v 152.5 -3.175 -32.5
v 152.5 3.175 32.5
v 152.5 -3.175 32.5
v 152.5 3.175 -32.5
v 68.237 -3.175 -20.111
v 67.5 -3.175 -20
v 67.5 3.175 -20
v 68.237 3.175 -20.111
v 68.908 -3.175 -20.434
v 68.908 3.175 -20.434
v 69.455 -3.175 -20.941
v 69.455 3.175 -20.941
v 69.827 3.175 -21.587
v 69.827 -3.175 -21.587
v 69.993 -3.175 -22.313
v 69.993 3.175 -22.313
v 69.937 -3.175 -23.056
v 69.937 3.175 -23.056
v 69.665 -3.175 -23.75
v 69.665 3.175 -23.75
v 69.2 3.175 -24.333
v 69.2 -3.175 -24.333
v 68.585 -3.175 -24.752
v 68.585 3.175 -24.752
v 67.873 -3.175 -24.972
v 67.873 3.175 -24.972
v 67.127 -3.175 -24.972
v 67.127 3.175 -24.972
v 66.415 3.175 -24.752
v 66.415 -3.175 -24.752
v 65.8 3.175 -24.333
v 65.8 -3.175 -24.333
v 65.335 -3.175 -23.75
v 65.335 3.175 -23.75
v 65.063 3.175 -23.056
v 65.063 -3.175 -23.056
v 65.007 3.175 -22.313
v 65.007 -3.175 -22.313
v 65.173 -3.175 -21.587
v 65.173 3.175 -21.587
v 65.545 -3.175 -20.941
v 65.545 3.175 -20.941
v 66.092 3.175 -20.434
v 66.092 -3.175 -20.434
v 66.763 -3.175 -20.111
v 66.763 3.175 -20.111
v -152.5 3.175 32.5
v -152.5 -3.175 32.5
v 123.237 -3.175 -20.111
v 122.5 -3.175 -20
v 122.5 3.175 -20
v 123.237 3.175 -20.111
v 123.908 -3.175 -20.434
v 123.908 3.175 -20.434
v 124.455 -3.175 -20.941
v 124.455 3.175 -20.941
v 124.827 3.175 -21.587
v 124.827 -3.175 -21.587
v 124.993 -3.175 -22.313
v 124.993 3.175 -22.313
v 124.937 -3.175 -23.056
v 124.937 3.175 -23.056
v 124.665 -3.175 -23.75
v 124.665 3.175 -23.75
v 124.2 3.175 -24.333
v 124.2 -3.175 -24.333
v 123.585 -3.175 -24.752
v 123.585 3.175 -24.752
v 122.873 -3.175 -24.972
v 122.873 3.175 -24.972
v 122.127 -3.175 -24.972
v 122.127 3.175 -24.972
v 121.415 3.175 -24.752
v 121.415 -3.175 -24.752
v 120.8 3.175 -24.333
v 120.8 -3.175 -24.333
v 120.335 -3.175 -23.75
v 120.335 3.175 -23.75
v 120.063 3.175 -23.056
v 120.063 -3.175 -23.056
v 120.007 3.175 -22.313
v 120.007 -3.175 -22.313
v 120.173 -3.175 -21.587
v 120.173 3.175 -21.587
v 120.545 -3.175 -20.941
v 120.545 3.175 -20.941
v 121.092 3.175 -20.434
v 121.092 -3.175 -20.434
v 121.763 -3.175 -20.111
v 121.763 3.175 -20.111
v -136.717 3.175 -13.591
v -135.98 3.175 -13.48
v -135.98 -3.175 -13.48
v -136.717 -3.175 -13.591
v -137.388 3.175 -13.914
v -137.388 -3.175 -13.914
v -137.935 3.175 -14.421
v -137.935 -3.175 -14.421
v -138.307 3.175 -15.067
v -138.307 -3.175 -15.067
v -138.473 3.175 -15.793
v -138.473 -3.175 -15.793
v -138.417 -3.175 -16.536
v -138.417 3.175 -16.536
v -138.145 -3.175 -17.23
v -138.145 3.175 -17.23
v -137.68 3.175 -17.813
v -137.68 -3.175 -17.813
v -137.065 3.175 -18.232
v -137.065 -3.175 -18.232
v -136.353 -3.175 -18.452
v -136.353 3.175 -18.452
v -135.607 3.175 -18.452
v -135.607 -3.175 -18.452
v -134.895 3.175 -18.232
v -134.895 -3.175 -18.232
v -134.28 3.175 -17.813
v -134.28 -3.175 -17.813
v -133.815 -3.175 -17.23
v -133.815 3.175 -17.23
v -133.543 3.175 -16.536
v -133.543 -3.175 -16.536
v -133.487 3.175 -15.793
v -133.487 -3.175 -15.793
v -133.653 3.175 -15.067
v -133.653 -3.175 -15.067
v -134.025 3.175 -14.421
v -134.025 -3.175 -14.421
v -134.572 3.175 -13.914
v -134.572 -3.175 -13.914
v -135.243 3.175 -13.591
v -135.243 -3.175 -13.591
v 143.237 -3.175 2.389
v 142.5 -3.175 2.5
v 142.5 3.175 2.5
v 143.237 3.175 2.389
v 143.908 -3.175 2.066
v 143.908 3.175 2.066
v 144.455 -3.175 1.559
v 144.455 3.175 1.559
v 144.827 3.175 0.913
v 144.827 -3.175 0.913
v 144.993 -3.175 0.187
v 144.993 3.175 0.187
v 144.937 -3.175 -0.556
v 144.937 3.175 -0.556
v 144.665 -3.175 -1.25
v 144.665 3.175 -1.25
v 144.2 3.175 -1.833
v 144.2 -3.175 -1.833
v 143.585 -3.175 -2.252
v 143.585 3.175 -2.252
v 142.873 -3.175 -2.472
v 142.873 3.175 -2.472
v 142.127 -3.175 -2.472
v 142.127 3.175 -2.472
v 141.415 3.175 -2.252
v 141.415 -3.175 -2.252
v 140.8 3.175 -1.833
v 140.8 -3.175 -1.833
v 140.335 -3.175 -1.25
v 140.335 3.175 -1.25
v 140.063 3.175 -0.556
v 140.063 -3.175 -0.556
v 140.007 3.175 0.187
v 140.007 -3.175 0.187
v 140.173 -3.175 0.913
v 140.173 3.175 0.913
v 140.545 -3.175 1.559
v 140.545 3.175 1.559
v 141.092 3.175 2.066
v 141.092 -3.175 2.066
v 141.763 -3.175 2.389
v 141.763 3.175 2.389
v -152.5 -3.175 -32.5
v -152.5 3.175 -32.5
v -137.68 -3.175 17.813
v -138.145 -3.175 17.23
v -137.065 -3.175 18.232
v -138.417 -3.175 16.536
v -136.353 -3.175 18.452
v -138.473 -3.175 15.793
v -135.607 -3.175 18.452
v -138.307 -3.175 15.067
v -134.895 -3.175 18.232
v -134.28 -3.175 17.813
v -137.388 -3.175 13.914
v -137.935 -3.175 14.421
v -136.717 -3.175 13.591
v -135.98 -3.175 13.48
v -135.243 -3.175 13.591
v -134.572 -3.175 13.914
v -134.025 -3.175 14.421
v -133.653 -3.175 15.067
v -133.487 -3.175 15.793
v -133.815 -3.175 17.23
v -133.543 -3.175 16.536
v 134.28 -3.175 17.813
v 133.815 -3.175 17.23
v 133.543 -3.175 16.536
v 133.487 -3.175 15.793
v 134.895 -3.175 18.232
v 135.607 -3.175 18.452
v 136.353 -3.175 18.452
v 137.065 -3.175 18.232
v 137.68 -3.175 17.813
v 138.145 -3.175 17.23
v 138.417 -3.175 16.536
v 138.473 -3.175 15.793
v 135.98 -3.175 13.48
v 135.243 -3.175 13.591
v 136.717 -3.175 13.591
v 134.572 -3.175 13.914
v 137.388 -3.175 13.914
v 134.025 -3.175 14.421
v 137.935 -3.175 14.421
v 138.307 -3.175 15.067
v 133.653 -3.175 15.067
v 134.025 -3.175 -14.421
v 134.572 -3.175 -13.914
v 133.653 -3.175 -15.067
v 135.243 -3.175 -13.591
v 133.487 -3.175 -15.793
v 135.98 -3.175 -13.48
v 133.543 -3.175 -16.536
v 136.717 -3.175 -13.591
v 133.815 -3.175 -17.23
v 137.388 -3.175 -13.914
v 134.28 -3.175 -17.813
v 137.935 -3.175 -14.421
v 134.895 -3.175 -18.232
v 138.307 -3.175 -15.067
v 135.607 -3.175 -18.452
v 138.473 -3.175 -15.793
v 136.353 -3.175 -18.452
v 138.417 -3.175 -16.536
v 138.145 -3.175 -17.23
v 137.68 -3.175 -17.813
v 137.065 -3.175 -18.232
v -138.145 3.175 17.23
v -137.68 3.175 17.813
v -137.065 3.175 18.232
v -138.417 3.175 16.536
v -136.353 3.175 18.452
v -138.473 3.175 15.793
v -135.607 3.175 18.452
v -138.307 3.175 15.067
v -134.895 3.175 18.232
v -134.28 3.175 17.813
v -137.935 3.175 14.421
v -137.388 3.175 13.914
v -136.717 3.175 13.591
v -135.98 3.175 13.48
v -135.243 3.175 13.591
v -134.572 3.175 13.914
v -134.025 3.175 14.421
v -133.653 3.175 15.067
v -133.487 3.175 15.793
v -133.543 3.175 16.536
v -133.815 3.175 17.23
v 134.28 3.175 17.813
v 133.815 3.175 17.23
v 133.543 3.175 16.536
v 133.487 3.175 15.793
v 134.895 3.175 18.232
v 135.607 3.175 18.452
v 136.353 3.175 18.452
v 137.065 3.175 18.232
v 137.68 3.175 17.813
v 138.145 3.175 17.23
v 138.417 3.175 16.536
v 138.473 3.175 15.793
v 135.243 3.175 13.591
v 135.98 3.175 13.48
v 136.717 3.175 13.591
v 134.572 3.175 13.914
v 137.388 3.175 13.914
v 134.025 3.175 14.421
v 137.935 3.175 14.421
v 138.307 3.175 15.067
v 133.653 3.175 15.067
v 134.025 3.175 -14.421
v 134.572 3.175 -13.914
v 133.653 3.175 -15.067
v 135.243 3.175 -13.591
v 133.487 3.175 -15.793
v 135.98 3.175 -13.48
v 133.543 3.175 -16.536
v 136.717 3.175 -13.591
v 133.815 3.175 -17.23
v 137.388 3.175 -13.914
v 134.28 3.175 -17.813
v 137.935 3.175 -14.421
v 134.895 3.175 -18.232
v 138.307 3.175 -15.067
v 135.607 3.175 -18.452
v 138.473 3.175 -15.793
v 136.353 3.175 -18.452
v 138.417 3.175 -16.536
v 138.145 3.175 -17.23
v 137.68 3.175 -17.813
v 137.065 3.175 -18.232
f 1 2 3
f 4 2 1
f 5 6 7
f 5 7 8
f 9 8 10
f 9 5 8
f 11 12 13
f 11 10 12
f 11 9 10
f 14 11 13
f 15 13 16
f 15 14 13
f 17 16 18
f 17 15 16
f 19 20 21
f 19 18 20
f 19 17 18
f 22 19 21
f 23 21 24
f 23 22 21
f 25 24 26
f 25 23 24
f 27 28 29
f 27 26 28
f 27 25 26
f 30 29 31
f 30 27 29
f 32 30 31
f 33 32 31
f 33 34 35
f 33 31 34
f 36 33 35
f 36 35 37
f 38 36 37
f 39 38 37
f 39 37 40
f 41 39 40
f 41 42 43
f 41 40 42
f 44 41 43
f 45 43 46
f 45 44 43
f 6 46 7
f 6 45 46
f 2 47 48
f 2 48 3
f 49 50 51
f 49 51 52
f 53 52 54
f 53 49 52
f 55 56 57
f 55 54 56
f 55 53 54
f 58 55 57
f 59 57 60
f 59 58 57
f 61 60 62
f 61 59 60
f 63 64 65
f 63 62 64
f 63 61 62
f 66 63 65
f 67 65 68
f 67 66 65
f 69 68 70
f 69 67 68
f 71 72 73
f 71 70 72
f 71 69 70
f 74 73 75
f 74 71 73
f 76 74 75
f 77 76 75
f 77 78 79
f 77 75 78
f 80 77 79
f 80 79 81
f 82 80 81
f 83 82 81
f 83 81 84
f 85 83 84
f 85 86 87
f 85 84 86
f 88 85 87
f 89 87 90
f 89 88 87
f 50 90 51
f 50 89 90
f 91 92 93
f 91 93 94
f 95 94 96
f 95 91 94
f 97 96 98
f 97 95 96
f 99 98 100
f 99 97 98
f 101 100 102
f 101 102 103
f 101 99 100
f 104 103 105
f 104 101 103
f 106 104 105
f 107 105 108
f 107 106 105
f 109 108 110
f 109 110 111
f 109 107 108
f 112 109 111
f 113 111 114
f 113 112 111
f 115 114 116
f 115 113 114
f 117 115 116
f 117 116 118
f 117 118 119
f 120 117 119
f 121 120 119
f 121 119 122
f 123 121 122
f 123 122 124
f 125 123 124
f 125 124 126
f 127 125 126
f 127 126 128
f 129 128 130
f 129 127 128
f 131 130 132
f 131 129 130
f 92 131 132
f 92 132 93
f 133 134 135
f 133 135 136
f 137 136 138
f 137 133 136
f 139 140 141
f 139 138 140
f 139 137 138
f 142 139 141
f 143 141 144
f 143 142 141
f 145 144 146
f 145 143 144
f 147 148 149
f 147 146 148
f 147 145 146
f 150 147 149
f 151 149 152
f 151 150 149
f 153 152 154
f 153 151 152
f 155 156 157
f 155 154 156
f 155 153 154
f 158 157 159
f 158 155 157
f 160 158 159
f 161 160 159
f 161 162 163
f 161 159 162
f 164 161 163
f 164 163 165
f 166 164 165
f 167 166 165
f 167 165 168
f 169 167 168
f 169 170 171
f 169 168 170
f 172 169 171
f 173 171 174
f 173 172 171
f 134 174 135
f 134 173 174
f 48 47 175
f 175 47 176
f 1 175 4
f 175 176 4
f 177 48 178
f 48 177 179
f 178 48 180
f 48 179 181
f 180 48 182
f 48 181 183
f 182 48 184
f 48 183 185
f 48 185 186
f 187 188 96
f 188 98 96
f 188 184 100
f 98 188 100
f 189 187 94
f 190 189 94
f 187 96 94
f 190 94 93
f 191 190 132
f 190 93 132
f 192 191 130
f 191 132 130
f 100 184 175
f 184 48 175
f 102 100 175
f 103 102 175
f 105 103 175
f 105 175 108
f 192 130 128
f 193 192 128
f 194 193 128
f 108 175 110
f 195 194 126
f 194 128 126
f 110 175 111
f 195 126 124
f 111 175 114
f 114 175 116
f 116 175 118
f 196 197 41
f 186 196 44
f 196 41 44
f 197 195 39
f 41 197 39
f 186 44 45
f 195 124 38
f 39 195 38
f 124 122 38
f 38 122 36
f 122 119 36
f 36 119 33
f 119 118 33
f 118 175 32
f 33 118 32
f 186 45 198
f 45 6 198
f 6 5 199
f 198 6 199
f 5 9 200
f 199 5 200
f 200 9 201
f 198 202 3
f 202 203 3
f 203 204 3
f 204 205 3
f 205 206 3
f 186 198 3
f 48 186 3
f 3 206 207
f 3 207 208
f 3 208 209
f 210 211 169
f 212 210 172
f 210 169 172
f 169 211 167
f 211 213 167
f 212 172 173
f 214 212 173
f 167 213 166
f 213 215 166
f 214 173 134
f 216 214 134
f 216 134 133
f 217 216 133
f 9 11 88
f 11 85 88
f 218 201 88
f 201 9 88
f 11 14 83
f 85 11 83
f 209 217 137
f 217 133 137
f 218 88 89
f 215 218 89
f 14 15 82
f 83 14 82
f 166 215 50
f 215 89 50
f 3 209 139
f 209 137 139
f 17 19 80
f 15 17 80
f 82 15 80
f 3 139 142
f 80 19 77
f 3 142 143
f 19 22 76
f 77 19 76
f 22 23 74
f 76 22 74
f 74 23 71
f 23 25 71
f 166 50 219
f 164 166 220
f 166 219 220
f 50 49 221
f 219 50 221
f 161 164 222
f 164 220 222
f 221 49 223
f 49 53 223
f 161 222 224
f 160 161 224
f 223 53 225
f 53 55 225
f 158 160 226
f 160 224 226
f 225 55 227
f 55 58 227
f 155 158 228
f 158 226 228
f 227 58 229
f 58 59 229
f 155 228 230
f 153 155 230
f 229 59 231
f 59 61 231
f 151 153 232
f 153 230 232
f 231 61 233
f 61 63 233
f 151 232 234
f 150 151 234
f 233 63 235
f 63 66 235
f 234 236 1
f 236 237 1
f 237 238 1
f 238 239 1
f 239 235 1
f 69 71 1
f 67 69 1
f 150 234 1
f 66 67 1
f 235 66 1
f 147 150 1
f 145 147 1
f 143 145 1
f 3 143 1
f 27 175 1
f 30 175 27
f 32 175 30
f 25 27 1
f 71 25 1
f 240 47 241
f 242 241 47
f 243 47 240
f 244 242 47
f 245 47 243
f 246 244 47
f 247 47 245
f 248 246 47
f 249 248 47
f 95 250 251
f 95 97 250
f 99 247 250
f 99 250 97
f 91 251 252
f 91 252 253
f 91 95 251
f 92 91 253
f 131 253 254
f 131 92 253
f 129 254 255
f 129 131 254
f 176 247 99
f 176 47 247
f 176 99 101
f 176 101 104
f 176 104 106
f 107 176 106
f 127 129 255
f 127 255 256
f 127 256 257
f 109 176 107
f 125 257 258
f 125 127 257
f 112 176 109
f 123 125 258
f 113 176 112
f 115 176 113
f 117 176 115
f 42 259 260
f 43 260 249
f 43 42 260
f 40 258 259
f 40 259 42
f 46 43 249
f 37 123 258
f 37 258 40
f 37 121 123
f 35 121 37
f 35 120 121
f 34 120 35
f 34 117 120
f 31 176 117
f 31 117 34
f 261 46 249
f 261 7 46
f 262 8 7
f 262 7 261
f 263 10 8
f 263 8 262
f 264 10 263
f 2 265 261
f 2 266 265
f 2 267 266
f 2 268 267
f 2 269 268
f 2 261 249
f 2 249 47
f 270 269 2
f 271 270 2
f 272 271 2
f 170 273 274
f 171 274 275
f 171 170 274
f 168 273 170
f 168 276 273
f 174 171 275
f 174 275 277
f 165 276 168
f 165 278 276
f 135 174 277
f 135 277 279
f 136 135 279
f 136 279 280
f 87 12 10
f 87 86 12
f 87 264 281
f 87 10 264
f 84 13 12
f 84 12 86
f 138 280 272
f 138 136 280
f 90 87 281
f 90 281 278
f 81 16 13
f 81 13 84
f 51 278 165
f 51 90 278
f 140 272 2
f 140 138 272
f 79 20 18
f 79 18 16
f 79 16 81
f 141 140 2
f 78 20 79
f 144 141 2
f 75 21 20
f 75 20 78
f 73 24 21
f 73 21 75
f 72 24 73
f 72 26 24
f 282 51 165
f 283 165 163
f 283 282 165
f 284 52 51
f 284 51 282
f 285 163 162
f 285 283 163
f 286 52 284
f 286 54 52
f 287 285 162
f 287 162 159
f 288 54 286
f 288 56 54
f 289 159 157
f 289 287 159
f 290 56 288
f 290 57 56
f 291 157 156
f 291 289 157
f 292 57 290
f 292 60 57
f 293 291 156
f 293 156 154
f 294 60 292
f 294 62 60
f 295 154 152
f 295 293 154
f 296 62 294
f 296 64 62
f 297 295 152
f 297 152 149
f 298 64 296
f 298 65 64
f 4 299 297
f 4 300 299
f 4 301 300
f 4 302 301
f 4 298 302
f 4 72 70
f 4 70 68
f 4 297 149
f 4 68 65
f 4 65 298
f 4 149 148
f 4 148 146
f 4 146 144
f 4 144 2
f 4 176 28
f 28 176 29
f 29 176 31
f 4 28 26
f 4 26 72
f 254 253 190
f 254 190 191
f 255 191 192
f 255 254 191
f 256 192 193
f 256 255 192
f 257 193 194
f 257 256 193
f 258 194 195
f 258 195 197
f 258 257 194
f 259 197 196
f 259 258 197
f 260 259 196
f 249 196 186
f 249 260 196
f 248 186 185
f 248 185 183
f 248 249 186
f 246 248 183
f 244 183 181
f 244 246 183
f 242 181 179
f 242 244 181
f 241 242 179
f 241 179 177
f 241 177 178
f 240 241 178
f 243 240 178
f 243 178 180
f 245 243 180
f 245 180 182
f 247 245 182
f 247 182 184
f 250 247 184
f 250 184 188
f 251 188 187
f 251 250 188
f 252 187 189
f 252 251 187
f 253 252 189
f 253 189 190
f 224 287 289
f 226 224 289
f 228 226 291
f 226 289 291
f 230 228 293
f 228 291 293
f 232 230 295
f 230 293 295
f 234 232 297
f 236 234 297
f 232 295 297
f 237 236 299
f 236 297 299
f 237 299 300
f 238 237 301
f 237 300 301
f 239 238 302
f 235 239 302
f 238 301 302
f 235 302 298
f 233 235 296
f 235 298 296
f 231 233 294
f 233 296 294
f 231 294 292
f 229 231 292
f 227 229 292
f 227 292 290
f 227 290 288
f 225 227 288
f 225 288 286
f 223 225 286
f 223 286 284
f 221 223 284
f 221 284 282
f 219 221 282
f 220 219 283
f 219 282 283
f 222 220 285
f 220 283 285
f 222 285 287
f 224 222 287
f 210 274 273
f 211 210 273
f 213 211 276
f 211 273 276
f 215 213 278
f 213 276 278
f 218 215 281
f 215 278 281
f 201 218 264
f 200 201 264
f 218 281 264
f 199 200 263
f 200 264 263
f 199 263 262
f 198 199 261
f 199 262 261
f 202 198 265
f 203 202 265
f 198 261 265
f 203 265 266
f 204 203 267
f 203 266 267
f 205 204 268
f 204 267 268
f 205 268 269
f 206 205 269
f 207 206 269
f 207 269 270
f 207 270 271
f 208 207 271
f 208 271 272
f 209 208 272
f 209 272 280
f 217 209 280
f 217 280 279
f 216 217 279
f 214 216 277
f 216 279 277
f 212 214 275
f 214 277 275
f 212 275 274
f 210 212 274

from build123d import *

# Parameters (mm, degrees)
SKETCH1_W               = 305
SKETCH1_H               = 65
BOSS_EXTRUDE1_DEPTH     = 3.175
CUT_EXTRUDE2_START      = -3.175
SKETCH4_R               = 2.5
CUT_EXTRUDE2_DEPTH      = 6.35
CUT_EXTRUDE3_DEPTH      = 157.053908955
CUT_EXTRUDE3_DEPTH_BACK = 157.053908955
SKETCH5_R               = 2.5


with BuildPart() as part:
    # Sketch1 → Boss-Extrude1 (new, symmetric)
    with BuildSketch(Plane(origin=(0, 0, 0), x_dir=(1, 0, 0), z_dir=(0, 1, 0))):
        Rectangle(SKETCH1_W, SKETCH1_H)
    extrude(amount=BOSS_EXTRUDE1_DEPTH, both=True)

    # Sketch4 → Cut-Extrude2 (cut)
    with BuildSketch(Plane(origin=(-2.5, 0, 0), x_dir=(-1, 0, 0), z_dir=(0, -1, 0)).offset(CUT_EXTRUDE2_START)):
        with Locations(Location((133.48, -15.98, 0), (0, 0, 90))):
            Circle(SKETCH4_R)
        with Locations(Location((133.48, 15.98, 0), (0, 0, 270))):
            Circle(SKETCH4_R)
    cut_extrude2 = extrude(amount=CUT_EXTRUDE2_DEPTH, mode=Mode.SUBTRACT)

    # Mirror2: Cut-Extrude2 across plane
    add(cut_extrude2.mirror(Plane(origin=(0, 0, 0), x_dir=(0, 0, 1), z_dir=(1, 0, 0))), mode=Mode.SUBTRACT)

    # Sketch5 → Cut-Extrude3 (cut, two sides: drawn at the far end of the back side and taken through both)
    with BuildSketch(Plane(origin=(0, 3.175, 0), x_dir=(1, 0, 0), z_dir=(0, 1, 0)).offset(-CUT_EXTRUDE3_DEPTH_BACK)):
        with Locations(Location((122.5, 22.5, 0), (0, 0, 270))):
            Circle(SKETCH5_R)
        with Locations(Location((67.5, 22.5, 0), (0, 0, 270))):
            Circle(SKETCH5_R)
        with Locations(Location((142.5, 0, 0), (0, 0, 270))):
            Circle(SKETCH5_R)
    extrude(amount=CUT_EXTRUDE3_DEPTH + CUT_EXTRUDE3_DEPTH_BACK, mode=Mode.SUBTRACT)


solid = part.part
